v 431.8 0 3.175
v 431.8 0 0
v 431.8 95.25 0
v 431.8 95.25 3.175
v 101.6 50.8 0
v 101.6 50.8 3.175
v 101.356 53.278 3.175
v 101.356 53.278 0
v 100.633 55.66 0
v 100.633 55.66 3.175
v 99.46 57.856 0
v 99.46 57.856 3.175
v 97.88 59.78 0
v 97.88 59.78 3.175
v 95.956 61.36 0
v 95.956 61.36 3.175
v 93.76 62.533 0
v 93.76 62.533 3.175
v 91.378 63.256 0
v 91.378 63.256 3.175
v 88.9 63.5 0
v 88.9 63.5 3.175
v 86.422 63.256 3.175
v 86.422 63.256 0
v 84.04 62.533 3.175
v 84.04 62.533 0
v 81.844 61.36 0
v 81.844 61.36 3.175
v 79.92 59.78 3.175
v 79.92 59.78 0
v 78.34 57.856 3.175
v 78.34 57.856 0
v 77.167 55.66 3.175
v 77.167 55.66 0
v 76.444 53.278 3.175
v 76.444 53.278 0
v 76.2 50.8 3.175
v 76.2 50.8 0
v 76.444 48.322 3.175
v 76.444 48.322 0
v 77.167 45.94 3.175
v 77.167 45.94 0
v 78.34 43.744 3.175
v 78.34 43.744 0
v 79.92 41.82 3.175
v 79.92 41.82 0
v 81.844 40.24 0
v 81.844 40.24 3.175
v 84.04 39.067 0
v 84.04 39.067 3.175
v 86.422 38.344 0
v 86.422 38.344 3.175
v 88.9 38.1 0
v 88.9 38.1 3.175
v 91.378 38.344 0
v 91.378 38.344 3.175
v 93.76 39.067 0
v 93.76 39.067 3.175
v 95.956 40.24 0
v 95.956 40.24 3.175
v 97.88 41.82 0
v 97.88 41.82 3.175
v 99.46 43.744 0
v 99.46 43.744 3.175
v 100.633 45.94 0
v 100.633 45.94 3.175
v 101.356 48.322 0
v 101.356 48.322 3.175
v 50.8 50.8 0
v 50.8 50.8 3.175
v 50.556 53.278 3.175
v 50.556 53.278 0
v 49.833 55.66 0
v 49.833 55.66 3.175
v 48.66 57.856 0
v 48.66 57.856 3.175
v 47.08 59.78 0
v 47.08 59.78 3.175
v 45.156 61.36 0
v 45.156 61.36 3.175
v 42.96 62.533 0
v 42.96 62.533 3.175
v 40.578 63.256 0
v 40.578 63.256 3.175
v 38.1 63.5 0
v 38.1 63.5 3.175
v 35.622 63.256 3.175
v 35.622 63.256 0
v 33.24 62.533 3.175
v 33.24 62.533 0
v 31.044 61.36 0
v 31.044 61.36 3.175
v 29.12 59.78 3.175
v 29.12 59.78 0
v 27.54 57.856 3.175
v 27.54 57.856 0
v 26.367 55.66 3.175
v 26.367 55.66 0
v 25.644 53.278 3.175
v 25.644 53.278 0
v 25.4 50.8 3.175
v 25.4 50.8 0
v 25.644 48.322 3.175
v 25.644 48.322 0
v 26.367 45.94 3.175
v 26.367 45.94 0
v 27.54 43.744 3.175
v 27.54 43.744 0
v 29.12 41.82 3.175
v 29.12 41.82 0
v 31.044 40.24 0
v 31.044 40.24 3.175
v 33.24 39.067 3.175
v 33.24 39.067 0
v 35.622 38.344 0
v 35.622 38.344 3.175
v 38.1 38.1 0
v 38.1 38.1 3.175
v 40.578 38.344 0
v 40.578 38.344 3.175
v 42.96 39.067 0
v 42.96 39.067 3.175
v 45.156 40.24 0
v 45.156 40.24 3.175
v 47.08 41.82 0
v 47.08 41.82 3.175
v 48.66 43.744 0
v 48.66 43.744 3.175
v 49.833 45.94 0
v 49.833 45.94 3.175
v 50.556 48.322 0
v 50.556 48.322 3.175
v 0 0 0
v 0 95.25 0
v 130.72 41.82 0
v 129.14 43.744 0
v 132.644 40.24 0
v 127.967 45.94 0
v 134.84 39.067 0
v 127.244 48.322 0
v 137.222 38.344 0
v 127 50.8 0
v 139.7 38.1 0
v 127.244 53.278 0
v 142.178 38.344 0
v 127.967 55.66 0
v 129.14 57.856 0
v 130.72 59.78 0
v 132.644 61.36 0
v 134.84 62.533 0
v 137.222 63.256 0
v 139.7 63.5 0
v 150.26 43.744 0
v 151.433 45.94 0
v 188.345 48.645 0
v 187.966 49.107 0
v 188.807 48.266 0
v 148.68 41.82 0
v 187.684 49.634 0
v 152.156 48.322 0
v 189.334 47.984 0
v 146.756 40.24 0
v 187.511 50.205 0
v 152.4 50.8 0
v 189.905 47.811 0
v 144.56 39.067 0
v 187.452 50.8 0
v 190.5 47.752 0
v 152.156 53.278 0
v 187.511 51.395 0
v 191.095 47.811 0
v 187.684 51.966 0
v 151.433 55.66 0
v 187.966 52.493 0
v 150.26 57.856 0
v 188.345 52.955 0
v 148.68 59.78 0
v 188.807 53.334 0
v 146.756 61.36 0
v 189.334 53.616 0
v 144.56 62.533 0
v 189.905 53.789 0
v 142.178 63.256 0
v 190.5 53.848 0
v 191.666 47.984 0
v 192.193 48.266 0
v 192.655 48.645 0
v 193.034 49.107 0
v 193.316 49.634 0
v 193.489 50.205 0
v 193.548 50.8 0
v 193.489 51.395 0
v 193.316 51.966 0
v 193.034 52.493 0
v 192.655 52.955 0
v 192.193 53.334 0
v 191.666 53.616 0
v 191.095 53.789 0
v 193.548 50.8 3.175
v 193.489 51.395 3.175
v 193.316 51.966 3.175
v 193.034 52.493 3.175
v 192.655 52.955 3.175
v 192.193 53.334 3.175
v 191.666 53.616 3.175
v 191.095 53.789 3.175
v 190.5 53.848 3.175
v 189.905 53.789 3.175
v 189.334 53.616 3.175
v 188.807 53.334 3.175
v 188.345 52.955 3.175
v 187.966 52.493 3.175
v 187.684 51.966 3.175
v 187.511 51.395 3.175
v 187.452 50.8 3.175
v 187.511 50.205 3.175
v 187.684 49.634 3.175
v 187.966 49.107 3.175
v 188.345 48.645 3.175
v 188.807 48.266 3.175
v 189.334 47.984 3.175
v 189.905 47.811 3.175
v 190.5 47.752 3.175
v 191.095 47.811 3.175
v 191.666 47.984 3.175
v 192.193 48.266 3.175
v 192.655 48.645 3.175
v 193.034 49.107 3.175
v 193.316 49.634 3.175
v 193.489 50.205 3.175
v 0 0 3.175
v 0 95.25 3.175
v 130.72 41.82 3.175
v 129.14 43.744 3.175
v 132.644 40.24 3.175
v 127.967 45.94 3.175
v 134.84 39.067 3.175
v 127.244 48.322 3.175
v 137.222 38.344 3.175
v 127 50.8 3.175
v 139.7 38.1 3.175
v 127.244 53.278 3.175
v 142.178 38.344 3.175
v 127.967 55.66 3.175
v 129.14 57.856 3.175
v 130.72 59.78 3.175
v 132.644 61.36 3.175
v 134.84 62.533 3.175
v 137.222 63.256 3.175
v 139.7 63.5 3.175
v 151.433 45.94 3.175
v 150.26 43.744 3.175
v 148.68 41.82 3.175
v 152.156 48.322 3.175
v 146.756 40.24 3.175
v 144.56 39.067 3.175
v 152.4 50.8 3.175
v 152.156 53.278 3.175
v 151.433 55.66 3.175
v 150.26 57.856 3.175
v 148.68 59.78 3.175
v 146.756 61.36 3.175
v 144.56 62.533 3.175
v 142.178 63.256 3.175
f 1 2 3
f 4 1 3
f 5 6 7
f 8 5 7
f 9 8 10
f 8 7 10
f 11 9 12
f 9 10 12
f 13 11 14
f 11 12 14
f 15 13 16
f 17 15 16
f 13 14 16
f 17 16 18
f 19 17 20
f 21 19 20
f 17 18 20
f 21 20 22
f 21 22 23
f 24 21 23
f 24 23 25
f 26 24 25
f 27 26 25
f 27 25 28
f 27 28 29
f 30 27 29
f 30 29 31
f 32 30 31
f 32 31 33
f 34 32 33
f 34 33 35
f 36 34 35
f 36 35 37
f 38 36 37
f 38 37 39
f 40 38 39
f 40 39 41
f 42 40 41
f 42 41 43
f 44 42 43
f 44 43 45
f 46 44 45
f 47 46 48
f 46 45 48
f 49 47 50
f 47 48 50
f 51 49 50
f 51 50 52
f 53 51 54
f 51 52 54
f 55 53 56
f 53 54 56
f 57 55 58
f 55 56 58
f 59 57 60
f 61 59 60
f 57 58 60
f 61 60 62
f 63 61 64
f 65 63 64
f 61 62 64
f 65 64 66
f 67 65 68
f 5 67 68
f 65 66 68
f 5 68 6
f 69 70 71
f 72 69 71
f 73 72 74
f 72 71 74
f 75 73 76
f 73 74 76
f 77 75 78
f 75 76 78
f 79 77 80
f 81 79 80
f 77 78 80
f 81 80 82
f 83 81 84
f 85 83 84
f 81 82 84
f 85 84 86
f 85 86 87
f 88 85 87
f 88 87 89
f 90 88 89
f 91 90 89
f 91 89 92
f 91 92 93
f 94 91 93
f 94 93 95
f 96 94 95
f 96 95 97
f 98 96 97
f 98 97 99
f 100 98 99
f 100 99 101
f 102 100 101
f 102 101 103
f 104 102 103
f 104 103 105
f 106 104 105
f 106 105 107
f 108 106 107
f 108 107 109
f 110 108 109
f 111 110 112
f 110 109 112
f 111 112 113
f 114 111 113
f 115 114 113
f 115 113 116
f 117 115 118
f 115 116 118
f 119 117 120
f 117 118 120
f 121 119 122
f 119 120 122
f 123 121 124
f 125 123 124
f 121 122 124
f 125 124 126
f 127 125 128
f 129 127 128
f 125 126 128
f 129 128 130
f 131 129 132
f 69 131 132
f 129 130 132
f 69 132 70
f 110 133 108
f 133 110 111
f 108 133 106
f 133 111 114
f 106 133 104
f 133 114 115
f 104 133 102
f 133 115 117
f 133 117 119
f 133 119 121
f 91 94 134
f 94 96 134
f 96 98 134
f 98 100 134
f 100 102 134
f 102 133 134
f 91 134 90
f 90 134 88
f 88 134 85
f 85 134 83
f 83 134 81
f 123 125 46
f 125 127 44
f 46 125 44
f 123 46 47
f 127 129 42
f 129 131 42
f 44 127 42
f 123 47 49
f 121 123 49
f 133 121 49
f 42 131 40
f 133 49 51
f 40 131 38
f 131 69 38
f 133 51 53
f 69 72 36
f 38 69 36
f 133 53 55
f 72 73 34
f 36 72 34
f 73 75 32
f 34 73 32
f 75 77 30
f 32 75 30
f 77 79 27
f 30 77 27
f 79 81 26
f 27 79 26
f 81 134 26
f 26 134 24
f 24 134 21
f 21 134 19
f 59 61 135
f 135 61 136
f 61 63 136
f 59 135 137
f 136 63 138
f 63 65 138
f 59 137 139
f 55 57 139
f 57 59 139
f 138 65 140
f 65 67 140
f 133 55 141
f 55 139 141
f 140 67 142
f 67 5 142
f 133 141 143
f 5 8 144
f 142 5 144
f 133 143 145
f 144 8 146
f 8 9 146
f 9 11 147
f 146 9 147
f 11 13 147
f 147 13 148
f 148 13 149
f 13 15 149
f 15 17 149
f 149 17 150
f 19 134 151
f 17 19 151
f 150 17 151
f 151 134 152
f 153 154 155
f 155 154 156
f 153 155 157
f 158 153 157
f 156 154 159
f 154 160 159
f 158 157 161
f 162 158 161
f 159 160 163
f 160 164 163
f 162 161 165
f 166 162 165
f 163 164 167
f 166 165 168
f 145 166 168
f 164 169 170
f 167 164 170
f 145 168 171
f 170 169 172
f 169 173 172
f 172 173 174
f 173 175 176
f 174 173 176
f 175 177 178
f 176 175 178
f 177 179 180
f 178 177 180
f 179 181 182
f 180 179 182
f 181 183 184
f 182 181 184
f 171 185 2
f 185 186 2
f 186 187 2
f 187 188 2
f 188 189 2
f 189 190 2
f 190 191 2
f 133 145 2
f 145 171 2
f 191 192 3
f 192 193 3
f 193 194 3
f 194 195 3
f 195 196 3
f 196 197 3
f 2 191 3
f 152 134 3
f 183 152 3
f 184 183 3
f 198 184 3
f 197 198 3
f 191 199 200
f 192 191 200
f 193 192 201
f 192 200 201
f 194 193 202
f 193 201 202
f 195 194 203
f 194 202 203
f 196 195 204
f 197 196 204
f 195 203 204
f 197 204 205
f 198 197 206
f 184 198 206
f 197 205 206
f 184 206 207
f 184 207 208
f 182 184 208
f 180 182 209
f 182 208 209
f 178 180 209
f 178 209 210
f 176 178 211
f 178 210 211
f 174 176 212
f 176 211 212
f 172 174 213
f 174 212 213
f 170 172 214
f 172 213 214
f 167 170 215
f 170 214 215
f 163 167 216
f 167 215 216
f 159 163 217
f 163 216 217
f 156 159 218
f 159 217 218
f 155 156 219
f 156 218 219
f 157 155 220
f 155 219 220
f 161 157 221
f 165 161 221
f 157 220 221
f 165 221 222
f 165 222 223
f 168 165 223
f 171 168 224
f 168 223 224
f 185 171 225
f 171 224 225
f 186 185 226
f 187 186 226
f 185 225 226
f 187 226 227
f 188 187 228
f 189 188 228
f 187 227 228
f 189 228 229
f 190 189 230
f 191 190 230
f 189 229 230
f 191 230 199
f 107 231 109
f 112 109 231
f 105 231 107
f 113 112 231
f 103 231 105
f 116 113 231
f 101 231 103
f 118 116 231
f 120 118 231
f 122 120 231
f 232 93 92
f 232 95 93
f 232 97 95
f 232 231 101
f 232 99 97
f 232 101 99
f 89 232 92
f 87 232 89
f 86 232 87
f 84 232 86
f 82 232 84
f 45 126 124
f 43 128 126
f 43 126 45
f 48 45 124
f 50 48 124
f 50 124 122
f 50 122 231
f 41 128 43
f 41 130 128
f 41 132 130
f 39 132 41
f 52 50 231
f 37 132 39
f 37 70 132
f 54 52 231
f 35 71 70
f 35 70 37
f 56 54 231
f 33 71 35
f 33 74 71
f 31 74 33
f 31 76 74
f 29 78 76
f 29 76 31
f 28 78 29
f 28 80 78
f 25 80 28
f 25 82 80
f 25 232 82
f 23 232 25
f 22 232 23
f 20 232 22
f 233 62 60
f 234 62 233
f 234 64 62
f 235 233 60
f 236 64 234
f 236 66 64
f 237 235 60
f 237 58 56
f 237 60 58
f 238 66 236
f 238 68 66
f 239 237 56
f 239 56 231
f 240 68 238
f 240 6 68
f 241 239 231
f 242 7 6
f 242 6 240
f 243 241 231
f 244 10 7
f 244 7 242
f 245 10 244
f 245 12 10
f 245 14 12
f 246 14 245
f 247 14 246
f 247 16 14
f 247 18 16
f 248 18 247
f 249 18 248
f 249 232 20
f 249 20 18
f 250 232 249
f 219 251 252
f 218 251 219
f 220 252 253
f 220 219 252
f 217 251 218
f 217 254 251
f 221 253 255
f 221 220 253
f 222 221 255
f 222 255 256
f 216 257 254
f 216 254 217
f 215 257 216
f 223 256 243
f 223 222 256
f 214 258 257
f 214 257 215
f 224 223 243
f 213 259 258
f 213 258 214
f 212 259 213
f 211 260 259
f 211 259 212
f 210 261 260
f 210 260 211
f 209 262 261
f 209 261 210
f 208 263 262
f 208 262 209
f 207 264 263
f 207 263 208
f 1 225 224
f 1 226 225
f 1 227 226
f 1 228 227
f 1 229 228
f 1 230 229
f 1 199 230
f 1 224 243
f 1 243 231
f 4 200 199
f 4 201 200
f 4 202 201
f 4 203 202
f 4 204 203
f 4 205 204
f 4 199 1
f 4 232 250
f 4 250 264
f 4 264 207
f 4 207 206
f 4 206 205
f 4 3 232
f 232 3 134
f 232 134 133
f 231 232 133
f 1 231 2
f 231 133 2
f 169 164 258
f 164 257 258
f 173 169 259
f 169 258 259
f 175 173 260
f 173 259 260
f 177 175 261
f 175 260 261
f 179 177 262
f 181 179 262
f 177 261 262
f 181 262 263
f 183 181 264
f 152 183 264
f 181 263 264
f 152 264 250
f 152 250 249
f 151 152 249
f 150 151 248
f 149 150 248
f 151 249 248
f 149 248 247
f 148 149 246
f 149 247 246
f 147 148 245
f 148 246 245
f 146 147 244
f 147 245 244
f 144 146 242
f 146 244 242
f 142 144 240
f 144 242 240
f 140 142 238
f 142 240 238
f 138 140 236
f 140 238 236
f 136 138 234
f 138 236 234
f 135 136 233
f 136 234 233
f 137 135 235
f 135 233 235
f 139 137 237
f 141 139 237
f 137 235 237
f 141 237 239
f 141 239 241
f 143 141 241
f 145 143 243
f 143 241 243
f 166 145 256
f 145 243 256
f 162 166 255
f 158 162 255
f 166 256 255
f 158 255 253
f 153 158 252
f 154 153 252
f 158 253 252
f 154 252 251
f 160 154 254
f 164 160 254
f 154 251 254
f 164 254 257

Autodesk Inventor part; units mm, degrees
ref_plane "YZ Plane" through (0, 0, 0) normal (1, 0, 0) x (0, 1, 0)
ref_plane "XZ Plane" through (0, 0, 0) normal (0, 1, 0) x (-1, 0, 0)
ref_plane "XY Plane" through (0, 0, 0) normal (0, 0, 1) x (1, 0, 0)
sketch "Sketch1" plane through (0, 0, 0) normal (0, 0, 1) x (1, 0, 0)
  line L0 (0, 0) -> (431.8, 0)
  line L1 (431.8, 0) -> (431.8, 95.25)
  line L2 (431.8, 95.25) -> (0, 95.25)
  line L3 (0, 95.25) -> (0, 0)
  dimension "d0" = 431.8
  dimension "d1" = 95.25
extrude "Extrusion1" add sketch "Sketch1" along normal blind 3.175
sketch "Sketch2" plane through (0, 0, 3.175) normal (0, 0, 1) x (1, 0, 0)
  line L0 (0, 0) -> (38.1, 0)
  line L1 (0, 50.8) -> (0, 0)
  circle A0 centre (38.1, 50.8) radius 12.7
  circle A1 centre (88.9, 50.8) radius 12.7
  circle A2 centre (139.7, 50.8) radius 12.7
  circle A3 centre (190.5, 50.8) radius 3.048
  dimension "d6" = 25.4
  dimension "d18" = 6.096
extrude "Extrusion2" cut sketch "Sketch2" against normal blind 25.4
properties part number "220207 Front Bottom"
